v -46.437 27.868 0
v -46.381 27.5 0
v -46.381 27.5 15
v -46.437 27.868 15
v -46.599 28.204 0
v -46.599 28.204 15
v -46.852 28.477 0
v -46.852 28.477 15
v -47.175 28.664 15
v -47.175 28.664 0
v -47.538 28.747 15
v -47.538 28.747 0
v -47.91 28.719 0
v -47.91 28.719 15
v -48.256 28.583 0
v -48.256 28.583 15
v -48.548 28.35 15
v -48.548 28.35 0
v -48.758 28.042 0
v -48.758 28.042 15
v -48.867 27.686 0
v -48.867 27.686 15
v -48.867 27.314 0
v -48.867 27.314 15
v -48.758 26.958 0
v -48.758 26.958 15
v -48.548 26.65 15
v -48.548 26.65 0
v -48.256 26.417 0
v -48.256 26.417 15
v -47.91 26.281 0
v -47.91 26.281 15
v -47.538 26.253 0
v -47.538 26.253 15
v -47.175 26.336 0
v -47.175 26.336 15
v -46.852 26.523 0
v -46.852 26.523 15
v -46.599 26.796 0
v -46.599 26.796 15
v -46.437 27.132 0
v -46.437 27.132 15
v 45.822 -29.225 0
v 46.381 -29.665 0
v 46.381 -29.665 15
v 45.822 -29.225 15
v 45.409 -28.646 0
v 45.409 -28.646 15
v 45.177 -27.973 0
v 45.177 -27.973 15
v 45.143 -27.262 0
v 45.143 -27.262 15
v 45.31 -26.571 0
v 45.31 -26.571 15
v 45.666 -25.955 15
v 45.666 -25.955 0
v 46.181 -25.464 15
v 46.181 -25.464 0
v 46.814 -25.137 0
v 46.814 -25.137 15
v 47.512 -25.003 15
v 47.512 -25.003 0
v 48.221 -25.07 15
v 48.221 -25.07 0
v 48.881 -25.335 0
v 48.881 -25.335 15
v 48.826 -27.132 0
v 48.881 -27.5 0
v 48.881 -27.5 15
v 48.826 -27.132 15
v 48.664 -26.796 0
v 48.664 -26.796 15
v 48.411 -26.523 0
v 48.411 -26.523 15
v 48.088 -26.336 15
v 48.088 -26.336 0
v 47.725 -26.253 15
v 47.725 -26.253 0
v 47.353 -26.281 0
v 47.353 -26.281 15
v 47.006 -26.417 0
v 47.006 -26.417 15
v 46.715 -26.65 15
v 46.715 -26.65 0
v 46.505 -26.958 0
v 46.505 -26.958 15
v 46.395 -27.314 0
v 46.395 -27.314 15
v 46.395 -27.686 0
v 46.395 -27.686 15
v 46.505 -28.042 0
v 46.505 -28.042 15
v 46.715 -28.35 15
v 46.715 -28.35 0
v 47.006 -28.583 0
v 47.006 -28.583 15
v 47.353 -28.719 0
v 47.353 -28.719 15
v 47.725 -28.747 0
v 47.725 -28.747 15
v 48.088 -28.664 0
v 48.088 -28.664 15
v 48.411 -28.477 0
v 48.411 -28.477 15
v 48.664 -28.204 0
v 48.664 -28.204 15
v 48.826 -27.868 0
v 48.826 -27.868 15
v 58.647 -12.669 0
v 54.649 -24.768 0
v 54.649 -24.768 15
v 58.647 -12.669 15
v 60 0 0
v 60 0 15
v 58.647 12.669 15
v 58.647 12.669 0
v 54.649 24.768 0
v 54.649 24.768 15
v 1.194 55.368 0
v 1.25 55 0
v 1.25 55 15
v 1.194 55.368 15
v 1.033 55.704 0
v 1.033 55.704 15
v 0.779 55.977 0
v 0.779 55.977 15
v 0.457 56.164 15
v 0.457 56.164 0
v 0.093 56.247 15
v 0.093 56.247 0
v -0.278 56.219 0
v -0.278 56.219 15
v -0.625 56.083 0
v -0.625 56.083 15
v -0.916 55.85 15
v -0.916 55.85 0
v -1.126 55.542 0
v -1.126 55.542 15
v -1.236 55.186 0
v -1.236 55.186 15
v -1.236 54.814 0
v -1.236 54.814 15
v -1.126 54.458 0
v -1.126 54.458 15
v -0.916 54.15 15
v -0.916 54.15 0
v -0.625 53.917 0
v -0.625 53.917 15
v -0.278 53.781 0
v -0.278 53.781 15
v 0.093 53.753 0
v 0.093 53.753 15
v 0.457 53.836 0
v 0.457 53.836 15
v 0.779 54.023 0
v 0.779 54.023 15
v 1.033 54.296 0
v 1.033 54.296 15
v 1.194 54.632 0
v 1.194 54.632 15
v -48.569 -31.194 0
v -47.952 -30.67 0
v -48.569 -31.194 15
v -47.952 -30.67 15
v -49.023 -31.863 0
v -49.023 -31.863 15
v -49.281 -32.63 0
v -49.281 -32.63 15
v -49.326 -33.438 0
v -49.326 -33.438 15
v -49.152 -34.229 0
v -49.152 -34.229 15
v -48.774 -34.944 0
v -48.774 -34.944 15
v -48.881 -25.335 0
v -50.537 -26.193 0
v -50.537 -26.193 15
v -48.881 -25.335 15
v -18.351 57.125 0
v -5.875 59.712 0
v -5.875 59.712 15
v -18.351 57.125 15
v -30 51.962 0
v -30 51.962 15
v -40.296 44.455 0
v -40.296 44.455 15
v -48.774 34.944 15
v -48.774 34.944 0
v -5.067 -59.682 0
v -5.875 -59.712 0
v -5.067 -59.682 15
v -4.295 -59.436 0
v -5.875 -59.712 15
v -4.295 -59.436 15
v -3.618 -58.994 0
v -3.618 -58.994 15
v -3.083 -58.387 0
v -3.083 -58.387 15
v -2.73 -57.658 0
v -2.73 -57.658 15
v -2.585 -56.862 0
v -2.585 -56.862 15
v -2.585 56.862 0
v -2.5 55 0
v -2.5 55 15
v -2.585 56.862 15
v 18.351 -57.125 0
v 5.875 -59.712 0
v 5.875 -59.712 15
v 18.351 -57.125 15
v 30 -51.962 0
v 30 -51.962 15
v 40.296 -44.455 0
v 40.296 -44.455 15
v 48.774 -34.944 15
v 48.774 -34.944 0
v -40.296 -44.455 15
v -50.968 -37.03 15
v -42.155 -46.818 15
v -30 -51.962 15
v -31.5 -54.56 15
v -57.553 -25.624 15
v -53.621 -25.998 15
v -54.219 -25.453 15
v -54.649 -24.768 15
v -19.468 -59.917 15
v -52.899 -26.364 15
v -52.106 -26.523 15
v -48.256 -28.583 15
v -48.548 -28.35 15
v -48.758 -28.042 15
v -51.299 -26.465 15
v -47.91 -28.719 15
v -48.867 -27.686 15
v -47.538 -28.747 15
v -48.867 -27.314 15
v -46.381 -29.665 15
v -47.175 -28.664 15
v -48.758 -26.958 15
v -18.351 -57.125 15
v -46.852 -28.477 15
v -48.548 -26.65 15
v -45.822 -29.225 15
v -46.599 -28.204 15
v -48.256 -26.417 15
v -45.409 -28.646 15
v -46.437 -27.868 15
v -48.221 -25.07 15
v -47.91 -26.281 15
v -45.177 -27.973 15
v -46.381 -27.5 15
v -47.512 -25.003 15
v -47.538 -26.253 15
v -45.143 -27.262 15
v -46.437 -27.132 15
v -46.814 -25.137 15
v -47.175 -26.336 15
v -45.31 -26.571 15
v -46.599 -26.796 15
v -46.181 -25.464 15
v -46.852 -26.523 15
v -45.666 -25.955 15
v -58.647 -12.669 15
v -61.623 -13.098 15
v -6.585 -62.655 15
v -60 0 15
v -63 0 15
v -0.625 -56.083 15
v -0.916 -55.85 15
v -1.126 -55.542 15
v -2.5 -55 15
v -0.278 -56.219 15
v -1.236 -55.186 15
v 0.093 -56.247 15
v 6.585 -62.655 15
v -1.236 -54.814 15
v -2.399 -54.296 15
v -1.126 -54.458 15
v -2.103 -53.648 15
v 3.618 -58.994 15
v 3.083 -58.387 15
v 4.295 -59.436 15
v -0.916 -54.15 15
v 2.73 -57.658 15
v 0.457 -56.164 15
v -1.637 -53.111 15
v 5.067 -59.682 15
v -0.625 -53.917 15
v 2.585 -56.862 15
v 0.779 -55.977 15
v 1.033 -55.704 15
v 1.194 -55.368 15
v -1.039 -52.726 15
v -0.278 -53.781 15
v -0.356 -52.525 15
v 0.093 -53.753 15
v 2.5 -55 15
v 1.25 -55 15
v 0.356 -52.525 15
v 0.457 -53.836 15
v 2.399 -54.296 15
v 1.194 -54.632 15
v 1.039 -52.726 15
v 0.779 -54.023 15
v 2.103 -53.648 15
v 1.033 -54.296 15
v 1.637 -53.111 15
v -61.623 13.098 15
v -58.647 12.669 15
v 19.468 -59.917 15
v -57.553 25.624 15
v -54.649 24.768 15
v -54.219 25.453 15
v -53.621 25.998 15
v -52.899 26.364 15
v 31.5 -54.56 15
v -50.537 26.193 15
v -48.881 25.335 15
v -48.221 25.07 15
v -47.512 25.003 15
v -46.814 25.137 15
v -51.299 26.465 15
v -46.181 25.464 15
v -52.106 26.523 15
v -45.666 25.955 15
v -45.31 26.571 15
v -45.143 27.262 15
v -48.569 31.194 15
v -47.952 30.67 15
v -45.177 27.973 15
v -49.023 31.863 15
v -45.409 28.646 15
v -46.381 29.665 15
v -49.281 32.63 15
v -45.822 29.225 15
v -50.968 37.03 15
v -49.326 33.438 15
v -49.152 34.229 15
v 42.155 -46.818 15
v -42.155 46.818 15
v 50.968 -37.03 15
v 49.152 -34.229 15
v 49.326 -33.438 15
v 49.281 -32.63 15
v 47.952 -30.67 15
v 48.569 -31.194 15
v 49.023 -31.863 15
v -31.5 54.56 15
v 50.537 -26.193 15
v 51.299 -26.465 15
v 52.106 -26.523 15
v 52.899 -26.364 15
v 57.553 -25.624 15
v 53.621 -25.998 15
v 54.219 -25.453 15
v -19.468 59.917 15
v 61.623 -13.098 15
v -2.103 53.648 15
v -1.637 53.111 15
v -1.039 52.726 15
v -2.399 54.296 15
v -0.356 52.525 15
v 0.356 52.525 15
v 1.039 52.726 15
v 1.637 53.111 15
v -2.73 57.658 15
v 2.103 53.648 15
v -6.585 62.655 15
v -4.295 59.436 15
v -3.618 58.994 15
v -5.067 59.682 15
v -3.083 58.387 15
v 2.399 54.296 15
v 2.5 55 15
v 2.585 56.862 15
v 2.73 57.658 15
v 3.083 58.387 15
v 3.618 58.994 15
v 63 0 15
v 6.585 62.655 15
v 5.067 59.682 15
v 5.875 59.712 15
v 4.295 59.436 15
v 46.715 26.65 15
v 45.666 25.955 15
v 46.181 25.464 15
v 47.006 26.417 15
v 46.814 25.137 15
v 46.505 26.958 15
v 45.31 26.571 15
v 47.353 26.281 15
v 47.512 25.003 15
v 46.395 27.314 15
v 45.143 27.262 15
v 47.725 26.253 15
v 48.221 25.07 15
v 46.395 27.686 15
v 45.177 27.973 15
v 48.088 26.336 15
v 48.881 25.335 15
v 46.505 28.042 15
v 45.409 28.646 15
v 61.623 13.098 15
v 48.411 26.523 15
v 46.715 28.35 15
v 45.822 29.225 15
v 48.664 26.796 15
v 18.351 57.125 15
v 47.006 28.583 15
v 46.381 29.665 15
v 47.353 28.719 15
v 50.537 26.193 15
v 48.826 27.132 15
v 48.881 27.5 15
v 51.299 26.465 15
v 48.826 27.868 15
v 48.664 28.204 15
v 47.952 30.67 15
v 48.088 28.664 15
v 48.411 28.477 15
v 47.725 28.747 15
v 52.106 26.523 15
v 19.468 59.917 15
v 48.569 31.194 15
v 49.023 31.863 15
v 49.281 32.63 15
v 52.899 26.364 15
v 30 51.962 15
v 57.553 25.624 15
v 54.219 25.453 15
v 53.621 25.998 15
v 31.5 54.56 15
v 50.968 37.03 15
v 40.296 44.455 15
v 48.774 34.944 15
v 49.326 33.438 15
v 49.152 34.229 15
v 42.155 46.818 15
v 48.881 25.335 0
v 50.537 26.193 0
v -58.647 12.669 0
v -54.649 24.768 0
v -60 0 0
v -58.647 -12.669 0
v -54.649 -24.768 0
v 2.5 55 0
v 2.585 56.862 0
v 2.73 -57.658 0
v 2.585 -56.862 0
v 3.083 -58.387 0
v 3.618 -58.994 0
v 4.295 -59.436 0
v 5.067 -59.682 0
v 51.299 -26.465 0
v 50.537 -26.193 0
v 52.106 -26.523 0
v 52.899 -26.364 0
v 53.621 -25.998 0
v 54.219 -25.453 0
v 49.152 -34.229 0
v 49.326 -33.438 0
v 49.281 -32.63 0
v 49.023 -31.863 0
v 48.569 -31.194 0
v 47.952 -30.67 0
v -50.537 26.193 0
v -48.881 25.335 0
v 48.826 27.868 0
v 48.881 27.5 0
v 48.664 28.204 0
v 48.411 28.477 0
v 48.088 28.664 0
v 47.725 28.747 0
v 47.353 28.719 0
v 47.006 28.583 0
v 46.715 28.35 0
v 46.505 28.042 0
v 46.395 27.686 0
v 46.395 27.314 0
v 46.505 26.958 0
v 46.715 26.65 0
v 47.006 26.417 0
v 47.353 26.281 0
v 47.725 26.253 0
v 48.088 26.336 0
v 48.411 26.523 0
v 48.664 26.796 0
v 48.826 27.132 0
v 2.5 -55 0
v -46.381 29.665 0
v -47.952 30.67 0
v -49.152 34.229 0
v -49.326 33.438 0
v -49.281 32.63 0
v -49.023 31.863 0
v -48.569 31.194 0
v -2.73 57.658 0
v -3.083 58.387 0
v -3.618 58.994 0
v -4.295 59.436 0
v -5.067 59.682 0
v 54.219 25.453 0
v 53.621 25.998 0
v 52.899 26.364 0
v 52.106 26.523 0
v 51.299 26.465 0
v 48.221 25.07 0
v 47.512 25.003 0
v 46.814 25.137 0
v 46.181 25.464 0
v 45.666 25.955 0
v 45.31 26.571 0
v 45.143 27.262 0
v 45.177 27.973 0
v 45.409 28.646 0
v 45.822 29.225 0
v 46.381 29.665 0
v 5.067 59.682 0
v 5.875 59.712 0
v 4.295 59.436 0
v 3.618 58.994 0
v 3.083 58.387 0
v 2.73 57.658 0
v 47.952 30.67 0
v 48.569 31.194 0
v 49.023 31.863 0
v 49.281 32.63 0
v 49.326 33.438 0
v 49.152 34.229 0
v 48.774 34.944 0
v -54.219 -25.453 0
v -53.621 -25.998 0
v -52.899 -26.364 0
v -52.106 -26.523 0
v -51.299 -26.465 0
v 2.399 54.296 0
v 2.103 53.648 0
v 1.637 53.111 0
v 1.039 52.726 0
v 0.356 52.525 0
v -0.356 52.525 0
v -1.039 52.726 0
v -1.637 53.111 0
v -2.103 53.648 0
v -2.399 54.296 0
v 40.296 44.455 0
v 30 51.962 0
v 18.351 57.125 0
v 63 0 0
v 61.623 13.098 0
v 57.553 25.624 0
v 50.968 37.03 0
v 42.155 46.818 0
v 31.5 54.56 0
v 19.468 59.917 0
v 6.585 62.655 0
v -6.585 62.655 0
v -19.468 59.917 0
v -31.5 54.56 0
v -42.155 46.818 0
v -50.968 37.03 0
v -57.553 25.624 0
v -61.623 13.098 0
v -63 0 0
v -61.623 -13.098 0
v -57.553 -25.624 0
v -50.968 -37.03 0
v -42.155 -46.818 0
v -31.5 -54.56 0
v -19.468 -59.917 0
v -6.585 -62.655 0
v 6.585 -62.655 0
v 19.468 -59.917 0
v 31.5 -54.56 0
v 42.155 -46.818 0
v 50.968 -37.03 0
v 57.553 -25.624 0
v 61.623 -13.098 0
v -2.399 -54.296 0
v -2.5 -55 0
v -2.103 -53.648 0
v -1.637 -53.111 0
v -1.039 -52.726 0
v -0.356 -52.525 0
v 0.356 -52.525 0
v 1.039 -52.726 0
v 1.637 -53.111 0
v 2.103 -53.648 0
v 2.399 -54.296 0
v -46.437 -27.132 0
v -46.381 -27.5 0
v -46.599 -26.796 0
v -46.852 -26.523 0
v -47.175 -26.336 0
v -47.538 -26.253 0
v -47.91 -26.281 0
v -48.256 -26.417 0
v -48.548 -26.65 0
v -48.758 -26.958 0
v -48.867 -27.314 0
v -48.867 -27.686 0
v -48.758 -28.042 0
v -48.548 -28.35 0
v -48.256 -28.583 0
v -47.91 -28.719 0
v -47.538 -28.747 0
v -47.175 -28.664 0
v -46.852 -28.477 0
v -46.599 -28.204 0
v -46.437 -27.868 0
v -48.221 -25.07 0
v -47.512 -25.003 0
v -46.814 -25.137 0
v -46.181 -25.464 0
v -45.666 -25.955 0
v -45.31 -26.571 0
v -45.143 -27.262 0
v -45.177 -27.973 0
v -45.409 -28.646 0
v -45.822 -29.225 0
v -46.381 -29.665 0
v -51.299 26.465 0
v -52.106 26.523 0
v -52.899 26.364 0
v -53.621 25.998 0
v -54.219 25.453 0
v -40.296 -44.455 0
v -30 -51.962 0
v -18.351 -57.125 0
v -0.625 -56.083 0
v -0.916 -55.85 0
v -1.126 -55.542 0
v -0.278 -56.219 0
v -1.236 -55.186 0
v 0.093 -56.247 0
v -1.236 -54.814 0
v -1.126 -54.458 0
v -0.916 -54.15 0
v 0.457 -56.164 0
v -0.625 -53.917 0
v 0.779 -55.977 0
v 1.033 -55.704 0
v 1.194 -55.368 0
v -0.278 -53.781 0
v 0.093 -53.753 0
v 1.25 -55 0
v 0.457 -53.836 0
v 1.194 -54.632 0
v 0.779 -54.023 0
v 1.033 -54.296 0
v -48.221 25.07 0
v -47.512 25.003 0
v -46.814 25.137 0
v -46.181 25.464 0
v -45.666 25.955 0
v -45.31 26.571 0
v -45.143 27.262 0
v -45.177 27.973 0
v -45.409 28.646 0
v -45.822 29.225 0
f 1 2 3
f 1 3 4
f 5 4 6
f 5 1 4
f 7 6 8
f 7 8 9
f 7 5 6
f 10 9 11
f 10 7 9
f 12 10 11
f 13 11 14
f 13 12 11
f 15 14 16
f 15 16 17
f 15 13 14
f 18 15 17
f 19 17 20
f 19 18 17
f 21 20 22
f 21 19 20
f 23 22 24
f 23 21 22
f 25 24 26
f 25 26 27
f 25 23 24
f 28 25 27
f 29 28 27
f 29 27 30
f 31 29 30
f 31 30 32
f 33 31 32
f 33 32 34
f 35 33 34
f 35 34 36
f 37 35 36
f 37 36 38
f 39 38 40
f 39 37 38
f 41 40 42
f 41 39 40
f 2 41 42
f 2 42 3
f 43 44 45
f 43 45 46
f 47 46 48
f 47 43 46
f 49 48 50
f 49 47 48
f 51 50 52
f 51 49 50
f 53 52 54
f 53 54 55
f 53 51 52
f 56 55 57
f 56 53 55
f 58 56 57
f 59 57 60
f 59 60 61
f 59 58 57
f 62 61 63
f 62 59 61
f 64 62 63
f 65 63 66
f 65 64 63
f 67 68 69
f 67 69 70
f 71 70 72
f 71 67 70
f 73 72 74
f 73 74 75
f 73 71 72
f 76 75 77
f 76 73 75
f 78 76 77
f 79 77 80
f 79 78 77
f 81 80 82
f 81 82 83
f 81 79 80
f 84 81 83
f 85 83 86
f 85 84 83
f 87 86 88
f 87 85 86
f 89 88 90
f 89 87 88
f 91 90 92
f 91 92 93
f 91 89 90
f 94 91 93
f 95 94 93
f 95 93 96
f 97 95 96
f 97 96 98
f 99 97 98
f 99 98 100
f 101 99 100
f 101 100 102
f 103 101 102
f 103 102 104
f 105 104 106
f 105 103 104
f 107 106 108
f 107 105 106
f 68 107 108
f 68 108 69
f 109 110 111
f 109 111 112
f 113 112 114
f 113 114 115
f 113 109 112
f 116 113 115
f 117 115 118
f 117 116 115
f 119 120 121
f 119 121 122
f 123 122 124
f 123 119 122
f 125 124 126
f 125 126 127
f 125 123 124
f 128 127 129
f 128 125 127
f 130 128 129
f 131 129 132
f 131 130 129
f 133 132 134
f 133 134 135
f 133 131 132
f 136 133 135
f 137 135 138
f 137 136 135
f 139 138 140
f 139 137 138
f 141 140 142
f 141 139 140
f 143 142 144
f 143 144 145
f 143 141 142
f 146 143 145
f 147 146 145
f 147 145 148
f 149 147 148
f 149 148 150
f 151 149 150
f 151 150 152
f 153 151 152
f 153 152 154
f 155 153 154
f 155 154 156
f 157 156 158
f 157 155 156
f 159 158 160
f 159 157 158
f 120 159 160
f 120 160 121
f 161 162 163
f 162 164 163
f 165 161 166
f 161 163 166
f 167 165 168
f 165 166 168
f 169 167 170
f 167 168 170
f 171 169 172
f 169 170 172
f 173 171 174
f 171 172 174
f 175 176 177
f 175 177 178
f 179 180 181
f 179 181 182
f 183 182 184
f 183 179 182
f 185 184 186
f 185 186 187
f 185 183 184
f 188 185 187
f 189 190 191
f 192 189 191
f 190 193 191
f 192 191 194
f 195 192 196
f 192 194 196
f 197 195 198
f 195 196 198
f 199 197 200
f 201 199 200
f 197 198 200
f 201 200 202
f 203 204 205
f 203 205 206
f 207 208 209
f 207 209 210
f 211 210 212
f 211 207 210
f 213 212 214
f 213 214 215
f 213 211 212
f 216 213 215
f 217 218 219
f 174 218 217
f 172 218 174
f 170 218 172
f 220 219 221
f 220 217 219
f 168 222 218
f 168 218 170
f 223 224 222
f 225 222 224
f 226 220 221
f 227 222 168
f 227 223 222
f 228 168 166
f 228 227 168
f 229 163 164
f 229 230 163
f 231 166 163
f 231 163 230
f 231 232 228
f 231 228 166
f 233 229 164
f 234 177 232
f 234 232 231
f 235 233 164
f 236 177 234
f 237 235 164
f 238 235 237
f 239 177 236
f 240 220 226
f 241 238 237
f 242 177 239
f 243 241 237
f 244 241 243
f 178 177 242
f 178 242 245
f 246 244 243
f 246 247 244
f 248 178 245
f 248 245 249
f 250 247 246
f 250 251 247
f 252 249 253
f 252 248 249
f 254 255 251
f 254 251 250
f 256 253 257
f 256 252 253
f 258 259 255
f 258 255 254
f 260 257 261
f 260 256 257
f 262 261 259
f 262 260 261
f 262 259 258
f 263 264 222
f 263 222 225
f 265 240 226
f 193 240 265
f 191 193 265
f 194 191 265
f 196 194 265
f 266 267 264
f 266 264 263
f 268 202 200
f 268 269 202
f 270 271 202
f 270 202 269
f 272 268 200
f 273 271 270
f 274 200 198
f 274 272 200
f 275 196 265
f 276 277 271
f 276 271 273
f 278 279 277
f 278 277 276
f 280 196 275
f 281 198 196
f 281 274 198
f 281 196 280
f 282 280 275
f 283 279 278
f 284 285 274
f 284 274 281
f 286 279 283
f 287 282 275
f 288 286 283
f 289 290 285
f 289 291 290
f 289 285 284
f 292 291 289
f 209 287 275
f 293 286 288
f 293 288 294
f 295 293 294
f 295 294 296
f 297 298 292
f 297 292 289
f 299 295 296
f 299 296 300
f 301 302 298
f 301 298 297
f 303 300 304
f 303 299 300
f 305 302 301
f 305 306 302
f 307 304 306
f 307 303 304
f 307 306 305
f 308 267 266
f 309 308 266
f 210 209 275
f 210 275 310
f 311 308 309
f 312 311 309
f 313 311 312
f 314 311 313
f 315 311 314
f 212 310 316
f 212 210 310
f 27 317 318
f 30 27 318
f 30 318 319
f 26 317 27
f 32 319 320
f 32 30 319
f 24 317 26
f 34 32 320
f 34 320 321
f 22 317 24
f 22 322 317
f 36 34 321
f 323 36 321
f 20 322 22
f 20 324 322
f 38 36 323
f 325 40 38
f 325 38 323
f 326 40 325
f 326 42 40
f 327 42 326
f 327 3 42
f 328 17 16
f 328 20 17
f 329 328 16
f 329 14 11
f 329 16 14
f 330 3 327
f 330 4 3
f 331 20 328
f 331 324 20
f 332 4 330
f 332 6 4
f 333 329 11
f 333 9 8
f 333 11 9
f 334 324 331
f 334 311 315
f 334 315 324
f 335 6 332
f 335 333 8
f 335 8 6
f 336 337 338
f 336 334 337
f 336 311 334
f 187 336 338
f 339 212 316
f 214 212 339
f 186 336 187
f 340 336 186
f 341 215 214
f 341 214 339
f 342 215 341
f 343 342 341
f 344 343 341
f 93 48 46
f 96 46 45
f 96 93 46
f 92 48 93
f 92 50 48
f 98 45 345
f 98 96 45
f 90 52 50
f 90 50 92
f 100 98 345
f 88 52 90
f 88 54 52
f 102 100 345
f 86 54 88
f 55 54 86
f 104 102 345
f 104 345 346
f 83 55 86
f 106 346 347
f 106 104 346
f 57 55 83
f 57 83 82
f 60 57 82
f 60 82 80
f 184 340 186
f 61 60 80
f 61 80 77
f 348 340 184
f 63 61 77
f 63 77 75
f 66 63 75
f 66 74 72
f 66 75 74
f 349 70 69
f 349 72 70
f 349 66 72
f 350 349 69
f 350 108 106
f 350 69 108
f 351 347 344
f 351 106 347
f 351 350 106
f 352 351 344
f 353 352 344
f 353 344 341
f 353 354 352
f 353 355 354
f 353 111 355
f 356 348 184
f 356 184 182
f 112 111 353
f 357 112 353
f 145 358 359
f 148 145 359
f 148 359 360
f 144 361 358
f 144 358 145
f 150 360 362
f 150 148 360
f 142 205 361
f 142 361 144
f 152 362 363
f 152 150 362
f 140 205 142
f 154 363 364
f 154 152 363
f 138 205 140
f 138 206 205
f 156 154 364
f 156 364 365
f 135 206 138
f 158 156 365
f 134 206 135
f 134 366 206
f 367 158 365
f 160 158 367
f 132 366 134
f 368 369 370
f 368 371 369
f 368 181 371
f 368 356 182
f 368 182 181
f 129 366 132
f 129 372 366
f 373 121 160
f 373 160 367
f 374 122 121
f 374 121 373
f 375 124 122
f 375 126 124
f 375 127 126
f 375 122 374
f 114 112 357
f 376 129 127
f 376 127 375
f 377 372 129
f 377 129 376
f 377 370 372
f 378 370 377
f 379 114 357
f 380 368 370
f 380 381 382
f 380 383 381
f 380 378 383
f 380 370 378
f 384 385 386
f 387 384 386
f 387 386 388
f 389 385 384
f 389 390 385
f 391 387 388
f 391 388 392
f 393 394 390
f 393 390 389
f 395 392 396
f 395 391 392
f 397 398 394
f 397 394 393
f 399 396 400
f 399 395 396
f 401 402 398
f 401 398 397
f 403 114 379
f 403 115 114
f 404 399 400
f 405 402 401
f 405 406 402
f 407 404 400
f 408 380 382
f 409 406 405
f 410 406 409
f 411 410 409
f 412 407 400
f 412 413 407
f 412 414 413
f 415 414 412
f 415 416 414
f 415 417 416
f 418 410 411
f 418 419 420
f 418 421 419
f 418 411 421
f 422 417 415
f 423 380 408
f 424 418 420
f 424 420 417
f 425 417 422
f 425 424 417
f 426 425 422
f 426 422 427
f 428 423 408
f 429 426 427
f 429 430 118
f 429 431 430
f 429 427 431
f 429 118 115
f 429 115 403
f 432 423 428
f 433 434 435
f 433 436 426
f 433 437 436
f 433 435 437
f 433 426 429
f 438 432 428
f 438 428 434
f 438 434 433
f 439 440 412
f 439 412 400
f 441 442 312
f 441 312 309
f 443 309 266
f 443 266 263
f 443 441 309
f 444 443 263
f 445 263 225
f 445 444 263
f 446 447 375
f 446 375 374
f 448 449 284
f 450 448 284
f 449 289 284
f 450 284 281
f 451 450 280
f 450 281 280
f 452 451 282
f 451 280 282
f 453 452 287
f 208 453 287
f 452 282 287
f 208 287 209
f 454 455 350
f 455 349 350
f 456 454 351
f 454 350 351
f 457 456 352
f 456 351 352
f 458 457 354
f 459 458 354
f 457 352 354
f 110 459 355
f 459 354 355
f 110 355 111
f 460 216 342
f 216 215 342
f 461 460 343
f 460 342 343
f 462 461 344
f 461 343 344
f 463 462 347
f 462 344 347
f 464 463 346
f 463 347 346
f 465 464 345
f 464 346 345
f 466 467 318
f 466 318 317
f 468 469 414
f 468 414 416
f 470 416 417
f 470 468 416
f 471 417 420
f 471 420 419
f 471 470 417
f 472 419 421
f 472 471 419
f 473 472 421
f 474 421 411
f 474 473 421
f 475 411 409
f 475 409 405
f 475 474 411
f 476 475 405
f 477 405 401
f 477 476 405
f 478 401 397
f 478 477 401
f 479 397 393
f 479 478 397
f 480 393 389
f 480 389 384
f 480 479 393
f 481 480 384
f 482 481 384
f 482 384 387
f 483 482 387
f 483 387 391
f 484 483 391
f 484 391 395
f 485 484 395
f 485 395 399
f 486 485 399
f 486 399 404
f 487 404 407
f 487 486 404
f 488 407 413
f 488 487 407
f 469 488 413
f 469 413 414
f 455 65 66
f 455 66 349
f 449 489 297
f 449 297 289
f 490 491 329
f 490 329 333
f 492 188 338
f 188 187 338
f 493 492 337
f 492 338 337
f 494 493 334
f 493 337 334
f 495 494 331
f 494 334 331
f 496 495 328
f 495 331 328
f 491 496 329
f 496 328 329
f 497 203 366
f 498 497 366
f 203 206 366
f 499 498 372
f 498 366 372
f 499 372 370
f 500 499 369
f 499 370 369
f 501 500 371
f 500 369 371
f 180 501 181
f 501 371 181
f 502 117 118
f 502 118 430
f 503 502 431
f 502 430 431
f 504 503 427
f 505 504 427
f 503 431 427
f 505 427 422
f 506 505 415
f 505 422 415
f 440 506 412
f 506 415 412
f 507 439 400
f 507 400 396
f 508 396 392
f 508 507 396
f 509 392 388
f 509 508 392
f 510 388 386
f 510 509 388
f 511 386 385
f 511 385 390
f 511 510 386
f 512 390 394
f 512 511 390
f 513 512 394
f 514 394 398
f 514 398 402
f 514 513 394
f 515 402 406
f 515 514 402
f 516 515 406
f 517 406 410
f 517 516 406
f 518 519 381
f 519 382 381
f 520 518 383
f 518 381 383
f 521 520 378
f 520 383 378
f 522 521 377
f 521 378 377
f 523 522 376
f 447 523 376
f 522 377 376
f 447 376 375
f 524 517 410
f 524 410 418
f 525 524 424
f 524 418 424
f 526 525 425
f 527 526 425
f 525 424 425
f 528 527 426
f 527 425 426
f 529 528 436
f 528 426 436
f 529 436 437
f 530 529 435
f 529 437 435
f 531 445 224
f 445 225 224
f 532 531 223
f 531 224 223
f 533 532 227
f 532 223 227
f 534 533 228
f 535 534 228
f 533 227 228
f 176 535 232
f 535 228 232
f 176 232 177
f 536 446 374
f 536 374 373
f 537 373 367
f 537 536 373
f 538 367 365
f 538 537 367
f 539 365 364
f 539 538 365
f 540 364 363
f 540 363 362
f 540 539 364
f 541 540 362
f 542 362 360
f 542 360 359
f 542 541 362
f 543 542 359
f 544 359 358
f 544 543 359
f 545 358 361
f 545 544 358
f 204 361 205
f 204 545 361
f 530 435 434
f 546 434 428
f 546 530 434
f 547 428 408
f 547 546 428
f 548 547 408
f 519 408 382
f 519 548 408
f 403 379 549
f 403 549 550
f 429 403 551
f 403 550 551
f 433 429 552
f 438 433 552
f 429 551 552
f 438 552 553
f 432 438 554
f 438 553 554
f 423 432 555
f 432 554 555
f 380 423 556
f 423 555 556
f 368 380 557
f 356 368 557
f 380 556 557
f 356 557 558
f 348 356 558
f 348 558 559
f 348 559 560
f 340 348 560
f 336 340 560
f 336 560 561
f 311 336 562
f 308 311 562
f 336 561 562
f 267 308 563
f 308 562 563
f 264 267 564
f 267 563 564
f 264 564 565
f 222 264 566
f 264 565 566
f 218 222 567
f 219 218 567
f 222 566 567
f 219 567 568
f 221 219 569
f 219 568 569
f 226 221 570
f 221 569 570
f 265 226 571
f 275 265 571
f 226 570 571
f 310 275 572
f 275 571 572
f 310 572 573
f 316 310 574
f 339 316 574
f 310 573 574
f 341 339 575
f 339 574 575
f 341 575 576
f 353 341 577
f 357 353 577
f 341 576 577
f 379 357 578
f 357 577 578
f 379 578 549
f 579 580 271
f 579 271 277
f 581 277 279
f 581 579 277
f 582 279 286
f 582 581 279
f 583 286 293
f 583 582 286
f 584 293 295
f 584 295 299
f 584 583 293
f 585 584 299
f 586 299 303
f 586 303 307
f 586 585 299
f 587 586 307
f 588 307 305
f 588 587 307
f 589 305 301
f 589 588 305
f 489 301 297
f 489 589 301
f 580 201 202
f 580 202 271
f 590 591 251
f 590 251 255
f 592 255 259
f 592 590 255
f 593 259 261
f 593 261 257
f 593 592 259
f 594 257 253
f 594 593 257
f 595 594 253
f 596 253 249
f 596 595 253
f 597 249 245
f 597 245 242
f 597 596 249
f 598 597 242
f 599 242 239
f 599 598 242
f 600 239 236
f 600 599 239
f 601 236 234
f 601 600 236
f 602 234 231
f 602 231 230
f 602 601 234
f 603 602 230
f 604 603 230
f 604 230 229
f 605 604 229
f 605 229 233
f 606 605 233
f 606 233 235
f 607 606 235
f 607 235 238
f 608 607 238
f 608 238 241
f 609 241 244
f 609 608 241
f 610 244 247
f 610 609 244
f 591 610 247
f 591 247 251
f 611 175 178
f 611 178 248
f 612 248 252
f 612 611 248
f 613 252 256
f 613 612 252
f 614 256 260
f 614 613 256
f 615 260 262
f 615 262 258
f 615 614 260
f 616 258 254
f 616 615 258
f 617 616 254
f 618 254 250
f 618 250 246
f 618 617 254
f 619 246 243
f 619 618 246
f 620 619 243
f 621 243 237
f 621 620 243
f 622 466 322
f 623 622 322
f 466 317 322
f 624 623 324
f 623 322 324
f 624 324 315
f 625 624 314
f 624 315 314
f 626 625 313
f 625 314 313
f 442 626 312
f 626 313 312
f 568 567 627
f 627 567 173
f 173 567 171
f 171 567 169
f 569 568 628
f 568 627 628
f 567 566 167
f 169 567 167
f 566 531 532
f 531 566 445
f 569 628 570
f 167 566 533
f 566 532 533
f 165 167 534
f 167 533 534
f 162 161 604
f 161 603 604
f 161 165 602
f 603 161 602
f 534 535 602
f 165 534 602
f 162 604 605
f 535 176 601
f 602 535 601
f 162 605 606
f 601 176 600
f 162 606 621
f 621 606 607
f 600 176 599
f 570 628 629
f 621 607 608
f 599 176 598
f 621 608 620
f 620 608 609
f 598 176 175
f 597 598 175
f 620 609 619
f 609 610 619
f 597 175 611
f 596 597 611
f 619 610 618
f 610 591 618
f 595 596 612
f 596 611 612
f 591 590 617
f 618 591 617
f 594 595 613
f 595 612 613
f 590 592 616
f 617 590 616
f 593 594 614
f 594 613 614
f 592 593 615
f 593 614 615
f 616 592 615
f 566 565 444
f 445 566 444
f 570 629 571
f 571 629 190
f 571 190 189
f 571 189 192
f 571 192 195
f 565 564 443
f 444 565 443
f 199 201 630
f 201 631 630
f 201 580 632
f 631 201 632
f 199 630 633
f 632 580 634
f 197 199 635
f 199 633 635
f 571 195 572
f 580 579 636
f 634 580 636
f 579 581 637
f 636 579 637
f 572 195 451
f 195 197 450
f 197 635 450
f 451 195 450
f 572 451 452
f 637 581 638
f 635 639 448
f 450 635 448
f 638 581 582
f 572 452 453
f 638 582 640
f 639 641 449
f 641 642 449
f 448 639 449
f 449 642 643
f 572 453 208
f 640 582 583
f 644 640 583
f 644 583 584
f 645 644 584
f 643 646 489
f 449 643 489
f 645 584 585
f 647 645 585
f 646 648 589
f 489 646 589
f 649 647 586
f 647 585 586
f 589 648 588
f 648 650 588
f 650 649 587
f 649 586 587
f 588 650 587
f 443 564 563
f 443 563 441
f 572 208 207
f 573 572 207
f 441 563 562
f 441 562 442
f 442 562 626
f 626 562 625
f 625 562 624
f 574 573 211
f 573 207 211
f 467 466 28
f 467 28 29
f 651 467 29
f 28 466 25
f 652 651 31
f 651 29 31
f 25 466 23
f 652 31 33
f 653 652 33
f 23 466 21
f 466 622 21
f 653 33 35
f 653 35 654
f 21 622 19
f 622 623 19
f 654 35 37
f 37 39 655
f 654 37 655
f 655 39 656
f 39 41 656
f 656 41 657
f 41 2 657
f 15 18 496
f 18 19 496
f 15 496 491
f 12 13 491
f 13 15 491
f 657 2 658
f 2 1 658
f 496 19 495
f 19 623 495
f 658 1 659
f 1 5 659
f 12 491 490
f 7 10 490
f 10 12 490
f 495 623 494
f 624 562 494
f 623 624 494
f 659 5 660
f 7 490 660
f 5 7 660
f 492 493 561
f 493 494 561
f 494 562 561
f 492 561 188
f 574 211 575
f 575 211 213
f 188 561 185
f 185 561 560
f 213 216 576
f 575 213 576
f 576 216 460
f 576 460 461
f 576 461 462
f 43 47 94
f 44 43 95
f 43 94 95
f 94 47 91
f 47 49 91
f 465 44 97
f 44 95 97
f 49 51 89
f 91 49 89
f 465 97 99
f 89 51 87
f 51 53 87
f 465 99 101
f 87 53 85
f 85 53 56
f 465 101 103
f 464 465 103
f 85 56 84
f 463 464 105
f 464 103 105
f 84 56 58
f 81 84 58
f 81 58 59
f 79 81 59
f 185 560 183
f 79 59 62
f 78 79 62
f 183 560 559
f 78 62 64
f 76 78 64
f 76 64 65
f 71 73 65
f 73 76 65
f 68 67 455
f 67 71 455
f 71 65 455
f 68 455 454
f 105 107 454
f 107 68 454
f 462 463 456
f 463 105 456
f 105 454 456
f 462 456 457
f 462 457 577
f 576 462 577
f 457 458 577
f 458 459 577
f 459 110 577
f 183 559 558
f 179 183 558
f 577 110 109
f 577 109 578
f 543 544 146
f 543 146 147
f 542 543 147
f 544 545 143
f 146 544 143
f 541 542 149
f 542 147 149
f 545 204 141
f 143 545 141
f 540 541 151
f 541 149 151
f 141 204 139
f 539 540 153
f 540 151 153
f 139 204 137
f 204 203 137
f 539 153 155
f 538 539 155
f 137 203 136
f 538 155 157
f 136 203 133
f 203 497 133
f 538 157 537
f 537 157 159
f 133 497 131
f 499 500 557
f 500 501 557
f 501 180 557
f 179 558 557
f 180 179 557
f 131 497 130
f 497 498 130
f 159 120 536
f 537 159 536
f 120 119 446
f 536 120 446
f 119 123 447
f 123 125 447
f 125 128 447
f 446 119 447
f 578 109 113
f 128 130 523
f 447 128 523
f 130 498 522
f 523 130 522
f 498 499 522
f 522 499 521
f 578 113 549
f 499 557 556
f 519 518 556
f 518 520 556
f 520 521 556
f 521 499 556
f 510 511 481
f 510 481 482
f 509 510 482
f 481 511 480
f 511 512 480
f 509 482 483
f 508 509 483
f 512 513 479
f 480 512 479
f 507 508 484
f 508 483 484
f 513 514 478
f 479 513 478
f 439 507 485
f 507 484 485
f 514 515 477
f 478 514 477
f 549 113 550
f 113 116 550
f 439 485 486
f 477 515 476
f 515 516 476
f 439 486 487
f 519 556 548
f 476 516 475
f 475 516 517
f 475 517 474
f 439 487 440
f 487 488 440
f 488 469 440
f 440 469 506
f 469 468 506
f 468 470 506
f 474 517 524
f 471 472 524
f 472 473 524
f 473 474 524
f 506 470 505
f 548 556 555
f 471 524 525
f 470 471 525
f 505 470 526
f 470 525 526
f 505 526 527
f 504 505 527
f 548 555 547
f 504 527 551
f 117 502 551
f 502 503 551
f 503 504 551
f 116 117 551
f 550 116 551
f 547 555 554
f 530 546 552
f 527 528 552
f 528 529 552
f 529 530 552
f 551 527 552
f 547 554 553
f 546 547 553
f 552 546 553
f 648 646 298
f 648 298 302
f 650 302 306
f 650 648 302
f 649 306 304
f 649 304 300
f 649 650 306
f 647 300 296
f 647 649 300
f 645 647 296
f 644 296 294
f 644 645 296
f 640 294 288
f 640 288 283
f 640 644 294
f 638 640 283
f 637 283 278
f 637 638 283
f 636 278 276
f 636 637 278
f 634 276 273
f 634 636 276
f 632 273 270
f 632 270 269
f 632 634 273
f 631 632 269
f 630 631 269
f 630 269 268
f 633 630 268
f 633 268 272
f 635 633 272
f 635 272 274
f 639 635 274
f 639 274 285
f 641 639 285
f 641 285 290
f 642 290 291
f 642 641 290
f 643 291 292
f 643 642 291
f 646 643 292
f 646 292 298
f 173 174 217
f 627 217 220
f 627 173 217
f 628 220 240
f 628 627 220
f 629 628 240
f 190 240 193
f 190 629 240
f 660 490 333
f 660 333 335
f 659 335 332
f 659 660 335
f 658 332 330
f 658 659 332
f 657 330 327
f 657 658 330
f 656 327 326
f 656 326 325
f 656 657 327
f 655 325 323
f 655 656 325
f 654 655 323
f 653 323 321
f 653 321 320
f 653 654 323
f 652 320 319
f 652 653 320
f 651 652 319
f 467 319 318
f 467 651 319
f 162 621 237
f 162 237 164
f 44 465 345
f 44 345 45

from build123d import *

# Parameters (mm, degrees)
SKETCH_1_R      = 63
SKETCH_1_R_2    = 1.25
EXTRUDE_1_DEPTH = 15
FILLET_1_R      = 3


with BuildPart() as part:
    # 草图1 → 凸台-拉伸1 (new body)
    with BuildSketch(Plane.XY):
        Circle(SKETCH_1_R)
        with Locations((0, 55)):
            Circle(SKETCH_1_R_2, mode=Mode.SUBTRACT)
        with Locations((47.631397208, 27.5)):
            Circle(SKETCH_1_R_2, mode=Mode.SUBTRACT)
        with Locations((47.631397208, -27.5)):
            Circle(SKETCH_1_R_2, mode=Mode.SUBTRACT)
        with Locations((0, -55)):
            Circle(SKETCH_1_R_2, mode=Mode.SUBTRACT)
        with Locations((-47.631397208, -27.5)):
            Circle(SKETCH_1_R_2, mode=Mode.SUBTRACT)
        with Locations((-47.631397208, 27.5)):
            Circle(SKETCH_1_R_2, mode=Mode.SUBTRACT)
        with BuildLine():
            Line((-2.5, 55), (-2.724459655, 59.938112413))
            ThreePointArc((-2.724459655, 59.938112413), (-30, 51.961524227), (-50.545698177, 32.328507479))
            Line((-50.545698177, 32.328507479), (-46.381397208, 29.665063509))
            ThreePointArc((-46.381397208, 29.665063509), (-45.466333699, 26.25), (-48.881397208, 25.334936491))
            Line((-48.881397208, 25.334936491), (-53.270157832, 27.609604933))
            ThreePointArc((-53.270157832, 27.609604933), (-60, 0), (-53.270157832, -27.609604933))
            Line((-53.270157832, -27.609604933), (-48.881397208, -25.334936491))
            ThreePointArc((-48.881397208, -25.334936491), (-45.466333699, -26.25), (-46.381397208, -29.665063509))
            Line((-46.381397208, -29.665063509), (-50.545698177, -32.328507479))
            ThreePointArc((-50.545698177, -32.328507479), (-30, -51.961524227), (-2.724459655, -59.938112413))
            Line((-2.724459655, -59.938112413), (-2.5, -55))
            ThreePointArc((-2.5, -55), (0, -52.5), (2.5, -55))
            Line((2.5, -55), (2.724459655, -59.938112413))
            ThreePointArc((2.724459655, -59.938112413), (30, -51.961524227), (50.545698177, -32.328507479))
            Line((50.545698177, -32.328507479), (46.381397208, -29.665063509))
            ThreePointArc((46.381397208, -29.665063509), (45.466333699, -26.25), (48.881397208, -25.334936491))
            Line((48.881397208, -25.334936491), (53.270157832, -27.609604933))
            ThreePointArc((53.270157832, -27.609604933), (60, 0), (53.270157832, 27.609604933))
            Line((53.270157832, 27.609604933), (48.881397208, 25.334936491))
            ThreePointArc((48.881397208, 25.334936491), (45.466333699, 26.25), (46.381397208, 29.665063509))
            Line((46.381397208, 29.665063509), (50.545698177, 32.328507479))
            ThreePointArc((50.545698177, 32.328507479), (30, 51.961524227), (2.724459655, 59.938112413))
            Line((2.724459655, 59.938112413), (2.5, 55))
            ThreePointArc((2.5, 55), (0, 52.5), (-2.5, 55))
        make_face(mode=Mode.SUBTRACT)
    extrude(amount=EXTRUDE_1_DEPTH)

    # 圆角1
    fillet_1_edges = [part.edges().sort_by_distance(p)[0] for p in [
        (-2.724459655, 59.938112413, 7.5),
        (-50.545698177, 32.328507479, 7.5),
        (-53.270157832, 27.609604933, 7.5),
        (-53.270157832, -27.609604933, 7.5),
        (-50.545698177, -32.328507479, 7.5),
        (-2.724459655, -59.938112413, 7.5),
        (2.724459655, -59.938112413, 7.5),
        (50.545698177, -32.328507479, 7.5),
        (53.270157832, -27.609604933, 7.5),
        (53.270157832, 27.609604933, 7.5),
        (50.545698177, 32.328507479, 7.5),
        (2.724459655, 59.938112413, 7.5),
    ]]
    fillet(fillet_1_edges, radius=FILLET_1_R)


solid = part.part
